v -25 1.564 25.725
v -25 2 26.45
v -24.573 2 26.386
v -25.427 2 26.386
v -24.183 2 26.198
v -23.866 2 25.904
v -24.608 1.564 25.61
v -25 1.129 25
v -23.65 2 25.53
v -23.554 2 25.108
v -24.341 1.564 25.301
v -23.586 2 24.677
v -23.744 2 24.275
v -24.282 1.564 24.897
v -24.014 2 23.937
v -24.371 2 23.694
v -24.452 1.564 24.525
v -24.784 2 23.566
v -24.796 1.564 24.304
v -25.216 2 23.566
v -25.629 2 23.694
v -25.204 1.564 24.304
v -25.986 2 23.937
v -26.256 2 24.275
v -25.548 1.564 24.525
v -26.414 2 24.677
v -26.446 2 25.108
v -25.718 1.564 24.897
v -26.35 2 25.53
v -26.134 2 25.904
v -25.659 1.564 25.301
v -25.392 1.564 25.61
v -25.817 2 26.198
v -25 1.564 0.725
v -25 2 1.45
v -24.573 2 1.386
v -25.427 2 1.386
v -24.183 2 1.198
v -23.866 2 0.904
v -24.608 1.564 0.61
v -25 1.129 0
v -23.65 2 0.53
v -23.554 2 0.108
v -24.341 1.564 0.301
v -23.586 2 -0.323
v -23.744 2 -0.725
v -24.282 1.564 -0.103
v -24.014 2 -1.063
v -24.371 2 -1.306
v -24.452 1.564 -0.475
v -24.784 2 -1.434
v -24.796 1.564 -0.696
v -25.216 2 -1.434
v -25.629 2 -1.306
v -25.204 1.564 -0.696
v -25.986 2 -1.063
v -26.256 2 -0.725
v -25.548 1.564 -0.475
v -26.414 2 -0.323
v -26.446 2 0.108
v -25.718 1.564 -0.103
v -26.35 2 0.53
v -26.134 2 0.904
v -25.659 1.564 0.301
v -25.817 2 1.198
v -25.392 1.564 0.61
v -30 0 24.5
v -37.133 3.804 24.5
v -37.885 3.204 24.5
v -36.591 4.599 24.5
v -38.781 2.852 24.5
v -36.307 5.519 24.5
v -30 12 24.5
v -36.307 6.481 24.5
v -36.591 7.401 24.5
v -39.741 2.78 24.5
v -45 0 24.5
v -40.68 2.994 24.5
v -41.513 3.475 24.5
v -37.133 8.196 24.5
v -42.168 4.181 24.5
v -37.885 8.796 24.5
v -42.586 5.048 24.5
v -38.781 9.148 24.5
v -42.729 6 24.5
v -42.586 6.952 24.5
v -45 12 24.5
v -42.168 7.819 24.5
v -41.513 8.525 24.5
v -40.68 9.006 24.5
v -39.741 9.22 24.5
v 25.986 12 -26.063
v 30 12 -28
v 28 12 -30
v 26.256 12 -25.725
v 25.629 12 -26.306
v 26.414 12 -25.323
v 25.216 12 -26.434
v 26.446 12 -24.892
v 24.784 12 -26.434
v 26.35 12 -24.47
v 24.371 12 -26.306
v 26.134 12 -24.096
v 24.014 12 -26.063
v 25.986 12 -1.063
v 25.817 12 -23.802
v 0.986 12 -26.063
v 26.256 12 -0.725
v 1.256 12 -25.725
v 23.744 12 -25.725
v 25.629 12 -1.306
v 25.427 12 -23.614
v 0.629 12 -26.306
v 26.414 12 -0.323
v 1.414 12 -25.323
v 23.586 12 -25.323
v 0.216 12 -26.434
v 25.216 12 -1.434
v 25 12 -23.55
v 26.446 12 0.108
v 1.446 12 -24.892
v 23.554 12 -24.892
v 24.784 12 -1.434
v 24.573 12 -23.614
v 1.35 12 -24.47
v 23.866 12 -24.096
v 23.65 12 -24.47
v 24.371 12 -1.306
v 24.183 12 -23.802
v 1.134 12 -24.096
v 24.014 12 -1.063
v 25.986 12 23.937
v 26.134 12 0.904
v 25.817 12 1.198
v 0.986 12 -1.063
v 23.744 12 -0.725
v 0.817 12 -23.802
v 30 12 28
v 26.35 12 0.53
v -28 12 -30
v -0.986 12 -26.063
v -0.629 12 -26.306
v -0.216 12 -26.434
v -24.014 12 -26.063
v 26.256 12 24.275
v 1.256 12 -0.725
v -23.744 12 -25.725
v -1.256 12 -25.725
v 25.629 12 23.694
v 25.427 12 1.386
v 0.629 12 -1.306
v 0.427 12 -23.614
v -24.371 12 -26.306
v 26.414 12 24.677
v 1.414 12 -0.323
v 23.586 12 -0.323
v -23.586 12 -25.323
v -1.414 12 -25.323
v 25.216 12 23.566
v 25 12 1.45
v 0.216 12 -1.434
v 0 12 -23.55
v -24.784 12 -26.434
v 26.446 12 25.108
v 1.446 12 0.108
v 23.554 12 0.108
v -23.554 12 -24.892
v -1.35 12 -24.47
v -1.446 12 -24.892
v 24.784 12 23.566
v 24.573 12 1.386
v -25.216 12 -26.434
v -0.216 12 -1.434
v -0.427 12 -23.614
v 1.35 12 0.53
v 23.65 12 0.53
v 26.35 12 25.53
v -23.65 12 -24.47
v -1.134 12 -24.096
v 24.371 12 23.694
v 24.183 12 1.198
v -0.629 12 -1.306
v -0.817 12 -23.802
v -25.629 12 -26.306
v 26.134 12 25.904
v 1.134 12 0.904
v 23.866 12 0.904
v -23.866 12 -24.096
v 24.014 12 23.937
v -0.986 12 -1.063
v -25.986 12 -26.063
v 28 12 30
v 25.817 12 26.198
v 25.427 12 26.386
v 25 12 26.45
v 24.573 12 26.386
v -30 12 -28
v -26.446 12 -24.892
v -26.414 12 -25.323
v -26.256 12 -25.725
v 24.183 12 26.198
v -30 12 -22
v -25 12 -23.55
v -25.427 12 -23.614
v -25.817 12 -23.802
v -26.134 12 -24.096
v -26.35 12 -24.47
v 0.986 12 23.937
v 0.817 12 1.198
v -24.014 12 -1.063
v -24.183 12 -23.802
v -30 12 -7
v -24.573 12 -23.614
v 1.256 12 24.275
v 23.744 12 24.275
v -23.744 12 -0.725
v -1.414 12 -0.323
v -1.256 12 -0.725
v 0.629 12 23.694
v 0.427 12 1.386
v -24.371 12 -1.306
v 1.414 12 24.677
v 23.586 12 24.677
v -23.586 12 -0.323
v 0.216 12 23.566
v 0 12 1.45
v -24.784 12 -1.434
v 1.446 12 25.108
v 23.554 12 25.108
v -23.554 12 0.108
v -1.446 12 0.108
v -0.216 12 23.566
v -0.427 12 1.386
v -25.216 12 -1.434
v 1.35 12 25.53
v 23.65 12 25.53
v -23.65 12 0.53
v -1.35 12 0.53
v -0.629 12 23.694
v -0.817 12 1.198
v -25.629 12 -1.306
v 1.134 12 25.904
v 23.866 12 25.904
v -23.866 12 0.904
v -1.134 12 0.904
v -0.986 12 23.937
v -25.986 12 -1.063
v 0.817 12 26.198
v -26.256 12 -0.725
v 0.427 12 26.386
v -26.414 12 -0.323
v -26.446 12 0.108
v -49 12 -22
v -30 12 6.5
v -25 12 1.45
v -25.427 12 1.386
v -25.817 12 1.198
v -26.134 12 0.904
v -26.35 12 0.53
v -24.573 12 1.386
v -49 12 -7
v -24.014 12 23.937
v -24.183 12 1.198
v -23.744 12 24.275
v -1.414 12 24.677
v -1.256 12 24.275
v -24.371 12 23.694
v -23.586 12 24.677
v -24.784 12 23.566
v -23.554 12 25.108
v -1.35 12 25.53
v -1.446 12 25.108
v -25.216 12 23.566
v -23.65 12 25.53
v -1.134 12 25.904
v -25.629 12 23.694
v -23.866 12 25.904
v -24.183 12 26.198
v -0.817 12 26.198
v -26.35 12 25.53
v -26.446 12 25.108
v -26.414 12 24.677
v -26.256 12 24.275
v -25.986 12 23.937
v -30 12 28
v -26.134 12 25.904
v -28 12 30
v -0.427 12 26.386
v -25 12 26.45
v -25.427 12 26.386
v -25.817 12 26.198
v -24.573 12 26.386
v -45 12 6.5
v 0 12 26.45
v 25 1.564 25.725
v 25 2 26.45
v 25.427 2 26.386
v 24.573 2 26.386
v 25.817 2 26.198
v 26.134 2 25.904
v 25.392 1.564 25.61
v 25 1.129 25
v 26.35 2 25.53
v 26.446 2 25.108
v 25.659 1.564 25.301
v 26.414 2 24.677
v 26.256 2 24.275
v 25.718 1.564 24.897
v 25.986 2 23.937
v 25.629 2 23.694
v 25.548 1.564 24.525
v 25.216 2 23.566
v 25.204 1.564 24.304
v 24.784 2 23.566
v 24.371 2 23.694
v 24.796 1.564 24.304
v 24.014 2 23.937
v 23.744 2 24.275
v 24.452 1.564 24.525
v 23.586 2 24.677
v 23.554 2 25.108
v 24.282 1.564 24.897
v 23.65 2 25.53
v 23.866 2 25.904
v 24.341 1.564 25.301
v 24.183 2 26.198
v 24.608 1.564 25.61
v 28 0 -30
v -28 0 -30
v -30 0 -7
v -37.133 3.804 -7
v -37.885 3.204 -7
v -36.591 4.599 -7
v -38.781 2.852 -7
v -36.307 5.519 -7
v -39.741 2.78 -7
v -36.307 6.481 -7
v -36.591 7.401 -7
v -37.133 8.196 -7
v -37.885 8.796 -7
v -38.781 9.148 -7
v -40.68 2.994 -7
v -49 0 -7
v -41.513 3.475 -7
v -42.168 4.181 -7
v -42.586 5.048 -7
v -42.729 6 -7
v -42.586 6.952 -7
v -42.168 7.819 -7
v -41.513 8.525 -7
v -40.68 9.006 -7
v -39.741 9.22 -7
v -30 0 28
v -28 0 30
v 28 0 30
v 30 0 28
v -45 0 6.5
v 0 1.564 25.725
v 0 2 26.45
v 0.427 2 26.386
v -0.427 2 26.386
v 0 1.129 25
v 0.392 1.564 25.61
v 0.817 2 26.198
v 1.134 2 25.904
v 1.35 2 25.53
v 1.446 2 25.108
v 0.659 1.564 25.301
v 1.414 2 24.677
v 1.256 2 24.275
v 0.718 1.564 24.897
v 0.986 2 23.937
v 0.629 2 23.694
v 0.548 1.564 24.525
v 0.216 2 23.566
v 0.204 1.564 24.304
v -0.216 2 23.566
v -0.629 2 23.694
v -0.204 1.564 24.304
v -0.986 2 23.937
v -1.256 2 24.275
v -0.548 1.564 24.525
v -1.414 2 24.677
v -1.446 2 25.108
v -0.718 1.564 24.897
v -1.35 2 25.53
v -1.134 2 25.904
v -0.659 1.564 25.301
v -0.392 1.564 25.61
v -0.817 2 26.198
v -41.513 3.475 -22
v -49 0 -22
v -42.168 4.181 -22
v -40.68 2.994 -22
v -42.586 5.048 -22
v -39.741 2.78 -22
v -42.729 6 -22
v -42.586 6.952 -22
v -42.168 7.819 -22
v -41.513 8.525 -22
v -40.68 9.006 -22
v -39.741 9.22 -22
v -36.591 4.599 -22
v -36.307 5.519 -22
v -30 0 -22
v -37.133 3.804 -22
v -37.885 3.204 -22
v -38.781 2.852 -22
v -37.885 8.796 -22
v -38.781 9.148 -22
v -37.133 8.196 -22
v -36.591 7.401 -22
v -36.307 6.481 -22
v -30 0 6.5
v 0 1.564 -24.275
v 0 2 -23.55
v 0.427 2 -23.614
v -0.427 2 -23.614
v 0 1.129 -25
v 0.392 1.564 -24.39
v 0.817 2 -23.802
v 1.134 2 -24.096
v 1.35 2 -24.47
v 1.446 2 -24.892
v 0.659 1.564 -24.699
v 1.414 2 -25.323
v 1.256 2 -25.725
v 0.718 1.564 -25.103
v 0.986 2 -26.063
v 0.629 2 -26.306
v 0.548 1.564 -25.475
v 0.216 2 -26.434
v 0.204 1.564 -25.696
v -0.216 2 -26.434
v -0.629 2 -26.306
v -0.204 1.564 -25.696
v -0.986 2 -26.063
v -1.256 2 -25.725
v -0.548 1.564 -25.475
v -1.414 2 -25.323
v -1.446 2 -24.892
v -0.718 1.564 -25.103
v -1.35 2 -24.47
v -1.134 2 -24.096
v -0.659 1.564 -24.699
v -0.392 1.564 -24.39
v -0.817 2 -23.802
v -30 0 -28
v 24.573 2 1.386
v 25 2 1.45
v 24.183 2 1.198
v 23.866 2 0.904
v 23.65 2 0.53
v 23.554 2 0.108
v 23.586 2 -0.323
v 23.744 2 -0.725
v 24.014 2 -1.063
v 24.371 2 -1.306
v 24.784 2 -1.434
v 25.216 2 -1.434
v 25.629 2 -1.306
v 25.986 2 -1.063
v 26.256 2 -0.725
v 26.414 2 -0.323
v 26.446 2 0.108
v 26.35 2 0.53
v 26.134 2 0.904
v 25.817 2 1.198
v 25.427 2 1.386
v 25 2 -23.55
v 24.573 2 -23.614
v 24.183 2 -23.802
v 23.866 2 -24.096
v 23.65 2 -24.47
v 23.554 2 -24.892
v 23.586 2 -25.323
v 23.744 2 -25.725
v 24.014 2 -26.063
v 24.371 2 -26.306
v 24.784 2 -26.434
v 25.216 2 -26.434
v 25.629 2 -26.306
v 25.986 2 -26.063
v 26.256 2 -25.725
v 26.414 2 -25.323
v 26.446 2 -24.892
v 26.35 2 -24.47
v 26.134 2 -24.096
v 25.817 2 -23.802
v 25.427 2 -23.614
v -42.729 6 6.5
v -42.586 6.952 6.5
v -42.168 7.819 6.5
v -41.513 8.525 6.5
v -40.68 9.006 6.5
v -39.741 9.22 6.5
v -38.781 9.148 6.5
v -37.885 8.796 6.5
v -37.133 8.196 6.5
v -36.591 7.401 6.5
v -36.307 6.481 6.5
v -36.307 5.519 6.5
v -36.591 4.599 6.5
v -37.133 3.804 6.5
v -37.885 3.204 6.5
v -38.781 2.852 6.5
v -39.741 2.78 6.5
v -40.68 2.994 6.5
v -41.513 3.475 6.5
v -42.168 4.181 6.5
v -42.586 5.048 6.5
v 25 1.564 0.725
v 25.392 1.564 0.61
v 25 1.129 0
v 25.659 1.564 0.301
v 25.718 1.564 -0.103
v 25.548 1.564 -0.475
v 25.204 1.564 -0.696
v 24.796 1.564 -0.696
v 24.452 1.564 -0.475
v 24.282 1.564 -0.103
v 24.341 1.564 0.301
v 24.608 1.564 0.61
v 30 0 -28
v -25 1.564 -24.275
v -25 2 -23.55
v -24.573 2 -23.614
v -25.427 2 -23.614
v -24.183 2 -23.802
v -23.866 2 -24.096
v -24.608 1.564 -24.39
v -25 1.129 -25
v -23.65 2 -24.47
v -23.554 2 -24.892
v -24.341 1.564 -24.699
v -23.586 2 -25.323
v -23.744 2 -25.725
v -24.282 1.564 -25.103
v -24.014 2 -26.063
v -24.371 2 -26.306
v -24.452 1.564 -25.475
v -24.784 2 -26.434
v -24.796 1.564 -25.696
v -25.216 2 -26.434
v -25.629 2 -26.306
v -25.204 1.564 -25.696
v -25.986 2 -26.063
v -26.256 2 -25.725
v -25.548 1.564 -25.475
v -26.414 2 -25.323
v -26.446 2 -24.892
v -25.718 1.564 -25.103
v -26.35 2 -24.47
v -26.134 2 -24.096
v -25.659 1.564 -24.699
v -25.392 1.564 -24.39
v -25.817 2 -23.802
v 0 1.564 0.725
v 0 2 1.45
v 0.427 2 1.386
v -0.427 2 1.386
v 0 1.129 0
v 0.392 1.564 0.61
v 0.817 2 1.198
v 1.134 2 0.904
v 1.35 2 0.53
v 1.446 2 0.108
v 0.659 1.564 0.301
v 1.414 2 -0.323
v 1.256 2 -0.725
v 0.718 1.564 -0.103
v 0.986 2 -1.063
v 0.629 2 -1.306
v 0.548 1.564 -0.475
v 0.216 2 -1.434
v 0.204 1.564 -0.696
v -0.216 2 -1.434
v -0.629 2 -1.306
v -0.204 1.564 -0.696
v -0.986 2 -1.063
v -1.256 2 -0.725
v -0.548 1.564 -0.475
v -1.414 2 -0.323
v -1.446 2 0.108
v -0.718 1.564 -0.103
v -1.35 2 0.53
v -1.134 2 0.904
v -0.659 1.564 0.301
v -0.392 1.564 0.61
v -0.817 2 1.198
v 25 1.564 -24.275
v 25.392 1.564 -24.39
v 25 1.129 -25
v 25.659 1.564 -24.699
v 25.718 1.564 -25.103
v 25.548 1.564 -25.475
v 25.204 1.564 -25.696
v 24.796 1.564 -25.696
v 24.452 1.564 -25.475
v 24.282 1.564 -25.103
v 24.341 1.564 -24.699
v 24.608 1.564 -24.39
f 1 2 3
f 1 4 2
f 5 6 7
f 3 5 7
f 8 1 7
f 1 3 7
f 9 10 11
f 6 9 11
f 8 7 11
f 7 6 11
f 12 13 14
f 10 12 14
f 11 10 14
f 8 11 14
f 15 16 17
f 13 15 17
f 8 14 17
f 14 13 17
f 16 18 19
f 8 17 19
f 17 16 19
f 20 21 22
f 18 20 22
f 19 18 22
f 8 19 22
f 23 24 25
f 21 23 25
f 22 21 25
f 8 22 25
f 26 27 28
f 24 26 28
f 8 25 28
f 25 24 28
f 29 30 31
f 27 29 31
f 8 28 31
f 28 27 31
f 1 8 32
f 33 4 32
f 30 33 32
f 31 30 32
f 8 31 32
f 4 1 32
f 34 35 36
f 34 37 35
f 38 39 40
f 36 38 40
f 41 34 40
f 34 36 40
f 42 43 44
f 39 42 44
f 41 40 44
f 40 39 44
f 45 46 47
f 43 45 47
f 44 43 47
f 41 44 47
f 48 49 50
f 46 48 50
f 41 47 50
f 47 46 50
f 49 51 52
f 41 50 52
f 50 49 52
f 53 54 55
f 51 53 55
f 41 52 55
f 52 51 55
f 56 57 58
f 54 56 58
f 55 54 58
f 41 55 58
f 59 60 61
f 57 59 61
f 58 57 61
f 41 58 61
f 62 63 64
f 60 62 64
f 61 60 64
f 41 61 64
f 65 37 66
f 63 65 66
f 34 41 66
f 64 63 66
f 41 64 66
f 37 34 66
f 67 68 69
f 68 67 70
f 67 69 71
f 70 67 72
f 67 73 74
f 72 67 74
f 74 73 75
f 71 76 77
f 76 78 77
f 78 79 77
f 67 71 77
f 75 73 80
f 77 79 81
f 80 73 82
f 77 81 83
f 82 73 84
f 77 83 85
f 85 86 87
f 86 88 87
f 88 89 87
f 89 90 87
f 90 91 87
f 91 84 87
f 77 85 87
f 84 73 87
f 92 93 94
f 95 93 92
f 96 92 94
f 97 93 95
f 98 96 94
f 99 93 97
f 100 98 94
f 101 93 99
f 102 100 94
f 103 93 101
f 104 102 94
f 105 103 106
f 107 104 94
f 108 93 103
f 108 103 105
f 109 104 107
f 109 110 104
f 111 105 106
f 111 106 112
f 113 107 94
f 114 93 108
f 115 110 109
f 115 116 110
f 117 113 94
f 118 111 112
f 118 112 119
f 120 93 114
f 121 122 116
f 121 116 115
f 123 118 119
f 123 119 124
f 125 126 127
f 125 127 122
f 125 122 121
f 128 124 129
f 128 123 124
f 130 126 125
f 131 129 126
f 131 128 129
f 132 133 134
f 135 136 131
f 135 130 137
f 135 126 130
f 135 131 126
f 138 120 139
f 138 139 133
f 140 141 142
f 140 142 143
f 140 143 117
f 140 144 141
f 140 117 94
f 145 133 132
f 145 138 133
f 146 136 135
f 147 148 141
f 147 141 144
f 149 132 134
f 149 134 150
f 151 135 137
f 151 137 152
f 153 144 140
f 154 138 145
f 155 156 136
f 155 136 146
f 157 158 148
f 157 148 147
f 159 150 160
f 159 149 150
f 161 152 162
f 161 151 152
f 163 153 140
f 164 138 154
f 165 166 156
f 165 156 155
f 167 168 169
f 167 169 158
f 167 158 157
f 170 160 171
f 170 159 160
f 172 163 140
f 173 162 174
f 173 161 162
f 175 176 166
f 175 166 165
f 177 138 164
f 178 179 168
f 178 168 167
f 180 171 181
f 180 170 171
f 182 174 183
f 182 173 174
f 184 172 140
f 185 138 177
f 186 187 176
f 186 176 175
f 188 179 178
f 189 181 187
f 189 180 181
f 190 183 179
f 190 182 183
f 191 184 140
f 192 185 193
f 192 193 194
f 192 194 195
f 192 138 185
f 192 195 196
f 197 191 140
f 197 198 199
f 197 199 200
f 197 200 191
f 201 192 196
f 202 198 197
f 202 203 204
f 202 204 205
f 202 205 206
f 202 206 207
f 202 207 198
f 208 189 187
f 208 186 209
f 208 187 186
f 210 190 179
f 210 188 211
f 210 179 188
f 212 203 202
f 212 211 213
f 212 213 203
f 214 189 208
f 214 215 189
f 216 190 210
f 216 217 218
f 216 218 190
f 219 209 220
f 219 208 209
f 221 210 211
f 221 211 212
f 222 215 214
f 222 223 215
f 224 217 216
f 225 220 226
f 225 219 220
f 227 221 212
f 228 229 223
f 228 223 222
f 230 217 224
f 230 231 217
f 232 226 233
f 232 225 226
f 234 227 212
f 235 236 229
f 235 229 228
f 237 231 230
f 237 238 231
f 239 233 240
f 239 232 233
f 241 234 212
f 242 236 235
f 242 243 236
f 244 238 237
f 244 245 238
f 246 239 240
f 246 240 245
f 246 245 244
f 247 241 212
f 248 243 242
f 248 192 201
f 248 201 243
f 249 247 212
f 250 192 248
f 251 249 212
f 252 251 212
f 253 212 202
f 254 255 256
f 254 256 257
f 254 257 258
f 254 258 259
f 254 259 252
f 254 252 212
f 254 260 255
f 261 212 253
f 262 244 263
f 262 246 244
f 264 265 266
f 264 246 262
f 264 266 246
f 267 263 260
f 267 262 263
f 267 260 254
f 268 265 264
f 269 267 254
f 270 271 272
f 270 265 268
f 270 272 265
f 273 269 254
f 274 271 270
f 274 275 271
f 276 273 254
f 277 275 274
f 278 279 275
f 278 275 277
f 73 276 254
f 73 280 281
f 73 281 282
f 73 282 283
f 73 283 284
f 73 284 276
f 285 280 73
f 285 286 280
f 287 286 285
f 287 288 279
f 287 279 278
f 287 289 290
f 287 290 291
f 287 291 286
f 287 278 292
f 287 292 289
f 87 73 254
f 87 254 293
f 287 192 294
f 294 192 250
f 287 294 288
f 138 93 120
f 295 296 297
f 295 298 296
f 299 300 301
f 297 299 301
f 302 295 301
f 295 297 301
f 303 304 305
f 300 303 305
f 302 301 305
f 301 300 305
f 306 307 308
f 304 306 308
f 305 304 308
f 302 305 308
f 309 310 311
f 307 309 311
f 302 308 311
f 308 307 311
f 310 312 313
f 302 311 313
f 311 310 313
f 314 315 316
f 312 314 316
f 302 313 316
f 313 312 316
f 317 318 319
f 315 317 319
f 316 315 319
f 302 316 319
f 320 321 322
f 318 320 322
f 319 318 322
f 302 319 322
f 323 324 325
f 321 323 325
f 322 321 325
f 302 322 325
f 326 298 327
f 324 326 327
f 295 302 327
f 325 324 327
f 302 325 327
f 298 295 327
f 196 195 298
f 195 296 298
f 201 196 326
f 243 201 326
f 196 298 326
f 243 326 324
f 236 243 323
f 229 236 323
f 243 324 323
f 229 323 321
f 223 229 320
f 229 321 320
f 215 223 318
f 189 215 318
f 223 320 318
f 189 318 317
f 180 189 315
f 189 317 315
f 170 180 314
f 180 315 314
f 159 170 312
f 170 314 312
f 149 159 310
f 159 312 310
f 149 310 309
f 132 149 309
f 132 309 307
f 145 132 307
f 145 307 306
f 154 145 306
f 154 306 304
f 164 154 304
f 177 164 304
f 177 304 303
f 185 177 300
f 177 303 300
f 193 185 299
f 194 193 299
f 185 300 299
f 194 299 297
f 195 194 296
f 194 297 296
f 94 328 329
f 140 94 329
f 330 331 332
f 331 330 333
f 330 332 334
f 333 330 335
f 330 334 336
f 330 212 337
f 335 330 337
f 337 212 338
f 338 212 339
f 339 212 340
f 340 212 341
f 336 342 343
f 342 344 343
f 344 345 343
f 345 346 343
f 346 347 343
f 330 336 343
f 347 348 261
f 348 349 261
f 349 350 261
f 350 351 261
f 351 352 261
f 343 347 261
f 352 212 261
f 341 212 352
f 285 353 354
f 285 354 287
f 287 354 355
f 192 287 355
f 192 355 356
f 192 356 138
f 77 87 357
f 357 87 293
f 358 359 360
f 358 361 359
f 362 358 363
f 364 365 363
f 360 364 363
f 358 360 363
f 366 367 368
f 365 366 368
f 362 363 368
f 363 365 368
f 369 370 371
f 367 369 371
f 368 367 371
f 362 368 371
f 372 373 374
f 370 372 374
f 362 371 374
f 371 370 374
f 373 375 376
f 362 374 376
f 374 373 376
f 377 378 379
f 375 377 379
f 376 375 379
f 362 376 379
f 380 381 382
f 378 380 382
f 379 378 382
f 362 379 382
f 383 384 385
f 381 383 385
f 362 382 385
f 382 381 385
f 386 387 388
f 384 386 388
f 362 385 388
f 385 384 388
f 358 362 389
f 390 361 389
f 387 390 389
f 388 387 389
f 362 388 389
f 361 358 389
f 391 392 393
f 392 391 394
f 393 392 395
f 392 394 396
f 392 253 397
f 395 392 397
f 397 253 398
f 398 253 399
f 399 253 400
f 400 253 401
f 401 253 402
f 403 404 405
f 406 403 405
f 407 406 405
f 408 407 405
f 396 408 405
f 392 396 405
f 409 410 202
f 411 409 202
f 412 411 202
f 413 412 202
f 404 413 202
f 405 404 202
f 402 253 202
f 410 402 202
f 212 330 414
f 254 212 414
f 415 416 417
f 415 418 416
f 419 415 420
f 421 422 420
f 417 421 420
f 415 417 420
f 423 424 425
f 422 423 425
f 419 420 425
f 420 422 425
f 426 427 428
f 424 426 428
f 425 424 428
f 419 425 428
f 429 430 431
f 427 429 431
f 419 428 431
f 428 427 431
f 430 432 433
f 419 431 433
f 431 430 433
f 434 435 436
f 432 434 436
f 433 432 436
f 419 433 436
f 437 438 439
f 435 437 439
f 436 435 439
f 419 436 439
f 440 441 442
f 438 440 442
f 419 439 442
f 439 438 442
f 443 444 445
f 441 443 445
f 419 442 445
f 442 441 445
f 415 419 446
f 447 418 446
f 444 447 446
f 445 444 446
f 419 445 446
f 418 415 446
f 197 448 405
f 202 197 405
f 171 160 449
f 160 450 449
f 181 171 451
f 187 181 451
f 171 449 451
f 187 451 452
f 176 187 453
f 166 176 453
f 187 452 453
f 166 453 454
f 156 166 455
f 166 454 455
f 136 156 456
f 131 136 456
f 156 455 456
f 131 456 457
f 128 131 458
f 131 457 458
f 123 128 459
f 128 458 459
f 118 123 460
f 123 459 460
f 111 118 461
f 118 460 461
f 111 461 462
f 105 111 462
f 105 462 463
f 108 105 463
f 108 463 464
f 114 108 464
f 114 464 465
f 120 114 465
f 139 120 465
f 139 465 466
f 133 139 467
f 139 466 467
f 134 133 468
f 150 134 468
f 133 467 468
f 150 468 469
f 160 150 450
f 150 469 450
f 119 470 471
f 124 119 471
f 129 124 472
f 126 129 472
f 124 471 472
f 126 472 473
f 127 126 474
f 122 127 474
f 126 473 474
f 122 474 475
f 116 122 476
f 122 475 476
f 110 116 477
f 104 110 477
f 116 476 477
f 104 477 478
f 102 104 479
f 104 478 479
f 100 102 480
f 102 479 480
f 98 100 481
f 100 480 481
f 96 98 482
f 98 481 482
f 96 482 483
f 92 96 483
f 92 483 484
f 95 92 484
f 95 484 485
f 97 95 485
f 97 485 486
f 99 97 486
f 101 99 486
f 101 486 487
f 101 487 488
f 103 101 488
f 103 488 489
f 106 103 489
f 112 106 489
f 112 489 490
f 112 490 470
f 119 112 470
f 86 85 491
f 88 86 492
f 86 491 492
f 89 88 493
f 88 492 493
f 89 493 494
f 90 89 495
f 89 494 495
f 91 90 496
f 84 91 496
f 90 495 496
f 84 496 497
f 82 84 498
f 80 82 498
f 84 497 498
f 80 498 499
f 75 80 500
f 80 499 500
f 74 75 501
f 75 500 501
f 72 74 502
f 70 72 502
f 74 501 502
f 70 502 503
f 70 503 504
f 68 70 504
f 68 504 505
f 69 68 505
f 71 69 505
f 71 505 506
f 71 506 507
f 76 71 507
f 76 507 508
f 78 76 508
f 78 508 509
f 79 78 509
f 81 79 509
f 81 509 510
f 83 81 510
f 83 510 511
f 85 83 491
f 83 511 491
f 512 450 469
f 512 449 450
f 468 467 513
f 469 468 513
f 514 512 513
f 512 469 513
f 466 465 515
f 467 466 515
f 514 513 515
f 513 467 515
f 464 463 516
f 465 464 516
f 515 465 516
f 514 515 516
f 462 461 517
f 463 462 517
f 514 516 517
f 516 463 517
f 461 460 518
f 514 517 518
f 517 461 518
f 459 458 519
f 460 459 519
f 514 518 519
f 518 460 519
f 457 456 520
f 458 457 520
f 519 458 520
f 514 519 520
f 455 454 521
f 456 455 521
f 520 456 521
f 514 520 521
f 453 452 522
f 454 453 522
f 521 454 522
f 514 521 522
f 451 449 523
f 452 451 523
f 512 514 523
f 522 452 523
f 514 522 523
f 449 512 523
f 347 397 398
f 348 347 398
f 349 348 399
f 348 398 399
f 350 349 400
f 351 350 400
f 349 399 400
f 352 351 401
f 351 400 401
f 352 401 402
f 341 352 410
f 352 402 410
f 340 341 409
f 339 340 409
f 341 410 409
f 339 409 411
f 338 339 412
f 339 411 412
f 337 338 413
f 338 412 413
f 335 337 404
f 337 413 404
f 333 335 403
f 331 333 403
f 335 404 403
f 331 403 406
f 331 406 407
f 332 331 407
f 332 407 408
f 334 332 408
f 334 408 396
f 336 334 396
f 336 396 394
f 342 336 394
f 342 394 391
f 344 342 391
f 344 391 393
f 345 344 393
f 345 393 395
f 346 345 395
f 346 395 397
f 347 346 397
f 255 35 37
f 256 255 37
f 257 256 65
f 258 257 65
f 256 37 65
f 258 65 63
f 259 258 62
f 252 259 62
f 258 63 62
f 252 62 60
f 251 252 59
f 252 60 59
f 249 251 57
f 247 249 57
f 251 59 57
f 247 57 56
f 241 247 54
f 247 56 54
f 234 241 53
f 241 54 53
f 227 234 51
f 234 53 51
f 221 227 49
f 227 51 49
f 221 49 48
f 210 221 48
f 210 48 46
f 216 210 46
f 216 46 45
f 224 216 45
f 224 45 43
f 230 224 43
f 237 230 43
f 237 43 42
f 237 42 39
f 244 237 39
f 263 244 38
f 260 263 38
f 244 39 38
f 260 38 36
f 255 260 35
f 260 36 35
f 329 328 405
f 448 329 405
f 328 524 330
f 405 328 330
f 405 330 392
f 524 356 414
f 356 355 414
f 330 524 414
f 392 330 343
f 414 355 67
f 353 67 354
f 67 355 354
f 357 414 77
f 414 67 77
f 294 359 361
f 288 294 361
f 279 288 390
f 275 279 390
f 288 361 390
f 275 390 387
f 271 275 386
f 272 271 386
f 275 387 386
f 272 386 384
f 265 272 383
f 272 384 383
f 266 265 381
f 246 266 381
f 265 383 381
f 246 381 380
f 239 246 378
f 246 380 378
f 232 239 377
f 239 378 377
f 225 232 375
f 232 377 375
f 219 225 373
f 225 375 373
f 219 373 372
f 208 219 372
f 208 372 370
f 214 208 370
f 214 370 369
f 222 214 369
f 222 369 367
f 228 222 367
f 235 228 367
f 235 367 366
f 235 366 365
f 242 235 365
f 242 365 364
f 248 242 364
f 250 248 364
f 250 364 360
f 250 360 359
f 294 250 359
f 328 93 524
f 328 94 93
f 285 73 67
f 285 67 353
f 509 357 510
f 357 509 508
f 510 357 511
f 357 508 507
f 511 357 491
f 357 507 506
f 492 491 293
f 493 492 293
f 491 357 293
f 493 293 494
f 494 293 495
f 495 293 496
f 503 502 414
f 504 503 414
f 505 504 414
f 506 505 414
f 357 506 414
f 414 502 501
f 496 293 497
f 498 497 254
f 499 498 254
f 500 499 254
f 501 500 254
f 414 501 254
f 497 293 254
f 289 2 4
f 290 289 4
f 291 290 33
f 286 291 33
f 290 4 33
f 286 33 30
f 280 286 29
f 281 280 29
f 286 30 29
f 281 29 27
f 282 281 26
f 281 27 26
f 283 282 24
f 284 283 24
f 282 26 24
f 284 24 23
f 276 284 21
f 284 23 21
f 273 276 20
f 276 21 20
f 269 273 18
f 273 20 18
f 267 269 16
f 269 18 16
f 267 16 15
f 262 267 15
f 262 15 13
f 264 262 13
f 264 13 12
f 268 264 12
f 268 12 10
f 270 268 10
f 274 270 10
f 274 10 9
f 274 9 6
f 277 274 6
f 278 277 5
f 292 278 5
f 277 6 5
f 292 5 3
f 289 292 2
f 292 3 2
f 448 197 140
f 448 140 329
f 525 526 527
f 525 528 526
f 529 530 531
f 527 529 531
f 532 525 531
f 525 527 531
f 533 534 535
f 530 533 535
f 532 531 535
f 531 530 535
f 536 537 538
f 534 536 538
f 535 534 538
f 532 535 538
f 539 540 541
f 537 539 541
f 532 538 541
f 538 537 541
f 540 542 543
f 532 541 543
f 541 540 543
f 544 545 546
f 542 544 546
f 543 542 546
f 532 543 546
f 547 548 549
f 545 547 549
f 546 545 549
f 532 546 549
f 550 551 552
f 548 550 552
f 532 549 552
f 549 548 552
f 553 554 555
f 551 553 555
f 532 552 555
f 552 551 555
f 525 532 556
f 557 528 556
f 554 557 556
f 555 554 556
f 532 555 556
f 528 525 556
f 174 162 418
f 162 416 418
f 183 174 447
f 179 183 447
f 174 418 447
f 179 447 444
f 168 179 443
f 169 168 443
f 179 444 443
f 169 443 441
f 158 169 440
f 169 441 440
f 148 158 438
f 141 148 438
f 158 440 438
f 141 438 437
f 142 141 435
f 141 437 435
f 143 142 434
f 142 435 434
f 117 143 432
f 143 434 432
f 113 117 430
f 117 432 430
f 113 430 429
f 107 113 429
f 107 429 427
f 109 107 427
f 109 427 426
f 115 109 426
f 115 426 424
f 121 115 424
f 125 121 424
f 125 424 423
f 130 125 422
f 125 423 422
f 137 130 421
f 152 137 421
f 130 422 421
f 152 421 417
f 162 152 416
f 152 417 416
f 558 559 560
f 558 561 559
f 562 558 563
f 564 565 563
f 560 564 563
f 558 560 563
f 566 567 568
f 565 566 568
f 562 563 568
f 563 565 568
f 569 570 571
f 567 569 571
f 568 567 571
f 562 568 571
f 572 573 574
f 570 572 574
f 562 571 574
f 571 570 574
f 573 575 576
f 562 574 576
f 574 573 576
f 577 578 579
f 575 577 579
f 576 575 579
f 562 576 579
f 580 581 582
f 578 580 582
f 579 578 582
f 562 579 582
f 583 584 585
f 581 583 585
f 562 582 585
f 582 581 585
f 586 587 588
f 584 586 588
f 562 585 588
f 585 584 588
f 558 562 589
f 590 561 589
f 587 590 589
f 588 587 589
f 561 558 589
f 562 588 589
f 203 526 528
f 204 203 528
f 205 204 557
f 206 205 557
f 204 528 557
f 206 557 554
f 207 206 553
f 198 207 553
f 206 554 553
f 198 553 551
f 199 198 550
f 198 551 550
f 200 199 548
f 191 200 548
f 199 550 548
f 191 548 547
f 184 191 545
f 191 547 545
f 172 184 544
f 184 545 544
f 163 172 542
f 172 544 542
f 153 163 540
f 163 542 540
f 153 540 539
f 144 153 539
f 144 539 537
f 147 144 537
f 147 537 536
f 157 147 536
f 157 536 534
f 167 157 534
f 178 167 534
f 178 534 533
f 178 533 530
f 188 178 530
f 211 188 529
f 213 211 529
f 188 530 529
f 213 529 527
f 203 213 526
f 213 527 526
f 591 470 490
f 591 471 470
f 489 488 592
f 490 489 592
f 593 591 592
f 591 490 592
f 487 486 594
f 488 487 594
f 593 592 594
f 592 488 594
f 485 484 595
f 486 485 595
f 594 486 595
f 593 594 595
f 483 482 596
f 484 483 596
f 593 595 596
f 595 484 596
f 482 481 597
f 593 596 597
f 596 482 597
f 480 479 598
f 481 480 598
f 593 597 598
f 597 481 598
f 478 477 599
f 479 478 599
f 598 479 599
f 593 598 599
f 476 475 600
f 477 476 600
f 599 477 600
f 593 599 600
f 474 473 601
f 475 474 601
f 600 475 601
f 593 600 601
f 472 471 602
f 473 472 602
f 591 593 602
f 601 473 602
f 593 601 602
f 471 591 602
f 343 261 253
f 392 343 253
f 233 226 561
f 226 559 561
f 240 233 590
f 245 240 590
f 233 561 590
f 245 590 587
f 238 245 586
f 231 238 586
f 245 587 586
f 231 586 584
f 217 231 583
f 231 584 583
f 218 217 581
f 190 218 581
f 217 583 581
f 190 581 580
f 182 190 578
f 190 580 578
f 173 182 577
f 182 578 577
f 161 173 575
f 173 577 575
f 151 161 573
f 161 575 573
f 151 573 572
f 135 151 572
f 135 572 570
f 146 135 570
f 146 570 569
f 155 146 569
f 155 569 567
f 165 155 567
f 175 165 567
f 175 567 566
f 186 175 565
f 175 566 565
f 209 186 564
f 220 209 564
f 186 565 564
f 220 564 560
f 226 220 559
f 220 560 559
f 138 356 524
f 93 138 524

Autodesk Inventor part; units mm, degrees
ref_plane "YZ Plane" through (0, 0, 0) normal (1, 0, 0) x (0, 1, 0)
ref_plane "XZ Plane" through (0, 0, 0) normal (0, 1, 0) x (-1, 0, 0)
sketch "Sketch1" plane through (0, 0, 0) normal (0, 1, 0) x (-1, 0, 0)
  line L0 (-30, -30) -> (30, -30)
  line L1 (30, -30) -> (30, 30)
  line L2 (30, 30) -> (-30, 30)
  line L3 (-30, 30) -> (-30, -30)
  line L4 (-30, -30) -> (30, 30) construction
  line L5 (30, -30) -> (-30, 30) construction
  circle A0 centre (0, 0) radius 7.5
  dimension "d0" = 60
  dimension "d1" = 60
  dimension "d13" = 15
extrude "Extrusion1" add sketch "Sketch1" along normal blind 12 contours L3 L2 L1 L0 | A0
sketch "Sketch2" plane through (0, 12, 0) normal (0, 1, 0) x (1, 0, 0)
  line L0 (30, 30) -> (-30, 30) projected
  line L1 (-30, 30) -> (-30, -30) projected
  line L2 (-30, -30) -> (30, -30) projected
  line L3 (30, -30) -> (30, 30) projected
  line L4 (25, -25) -> (-25, -25)
  line L5 (-25, -25) -> (-25, 25)
  line L6 (-25, 25) -> (25, 25)
  line L7 (25, 25) -> (25, -25)
  line L8 (25, -25) -> (-25, 25) construction
  line L9 (-25, -25) -> (25, 25) construction
  line L10 (0, -25) -> (0, 25)
  line L11 (-25, 0) -> (25, 0)
  point P0 (0, 0)
  point P1 (0, 0)
  dimension "d4" = 50
  dimension "d5" = 50
hole "Hole1" at (-25, 12, 25) at (-25, 12, -25) at (25, 12, -25) at (25, 12, 25) at (0, 12, 25) at (0, 12, 0) at (-25, 12, 0) at (0, 12, -25) at (25, 12, 0) direction (0, -1, 0) diameter 2.9 depth 10 tip angle 118
chamfer "Chamfer1" distance 2 angle 45 4 edges at (30, 6, 30) (30, 6, -30) (-30, 6, -30) (-30, 6, 30)
sketch "Sketch3" plane through (0, 12, 0) normal (0, 1, 0) x (1, 0, 0)
  line L0 (-28, -30) -> (-30, -28) projected
  line L1 (-28, -30) -> (28, -30) projected
  line L2 (30, -28) -> (28, -30) projected
  line L3 (30, -28) -> (30, 28) projected
  line L4 (28, 30) -> (30, 28) projected
  line L5 (28, 30) -> (-28, 30) projected
  line L6 (-30, 28) -> (-28, 30) projected
  line L7 (-30, 28) -> (-30, -28) projected
  circle A0 centre (0, 25) radius 1.45 projected
  circle A1 centre (0, 0) radius 1.45 projected
  circle A2 centre (25, -25) radius 1.45 projected
  circle A3 centre (-25, 25) radius 1.45 projected
  circle A4 centre (-25, -25) radius 1.45 projected
  circle A5 centre (25, 25) radius 1.45 projected
  circle A6 centre (0, -25) radius 1.45 projected
  circle A7 centre (-25, 0) radius 1.45 projected
  circle A8 centre (25, 0) radius 1.45 projected
  line L8 (-30, 28) -> (-30, -28) projected
  line L9 (-30, -24.5) -> (-45, -24.5)
  line L10 (-45, -24.5) -> (-45, -6.5)
  line L11 (-45, -6.5) -> (-30, -6.5)
  line L12 (-30, -6.5) -> (-30, -24.5)
  line L13 (-30, 7) -> (-45, 7)
  line L14 (-45, 7) -> (-45, 22)
  line L15 (-45, 22) -> (-30, 22)
  line L16 (-30, 22) -> (-30, 7)
  line L17 (-45, 7) -> (-49, 7)
  line L18 (-49, 7) -> (-49, 22)
  line L19 (-49, 22) -> (-45, 22)
  line L20 (-45, 22) -> (-45, 7)
  dimension "d17" = 15
  dimension "d18" = 18
  dimension "d19" = 5.5
  dimension "d20" = 15
  dimension "d21" = 8
  dimension "d22" = 19
ref_plane "Work Plane1" through (-30, 0, -30) normal (0, 1, 0) x (0, 0, 1)
extrude "Extrusion2" add sketch "Sketch3" against normal up to surface (12 mm away) contours L9 L10 L11 L7 | L13 L14 L15 L7 | L17 L18 L19 L14
sketch "Sketch4" plane through (-30, 12, -22) normal (0, 0, -1) x (-1, 0, 0)
  line L0 (15, 0) -> (15, -12) projected
  line L1 (19, -12) -> (0, -12) projected
  line L2 (19, 0) -> (19, -12) projected
  line L3 (0, 0) -> (19, 0) projected
  line L4 (0, -12) -> (0, 0) projected
  circle A0 centre (9.5, -6) radius 3.2291
  point P0 (-30, -12)
extrude "Extrusion3" cut sketch "Sketch4" against normal through all contours A0
properties part number "00_XY_stage-CHUO_SEIKI_LD-647-R1-Top"
